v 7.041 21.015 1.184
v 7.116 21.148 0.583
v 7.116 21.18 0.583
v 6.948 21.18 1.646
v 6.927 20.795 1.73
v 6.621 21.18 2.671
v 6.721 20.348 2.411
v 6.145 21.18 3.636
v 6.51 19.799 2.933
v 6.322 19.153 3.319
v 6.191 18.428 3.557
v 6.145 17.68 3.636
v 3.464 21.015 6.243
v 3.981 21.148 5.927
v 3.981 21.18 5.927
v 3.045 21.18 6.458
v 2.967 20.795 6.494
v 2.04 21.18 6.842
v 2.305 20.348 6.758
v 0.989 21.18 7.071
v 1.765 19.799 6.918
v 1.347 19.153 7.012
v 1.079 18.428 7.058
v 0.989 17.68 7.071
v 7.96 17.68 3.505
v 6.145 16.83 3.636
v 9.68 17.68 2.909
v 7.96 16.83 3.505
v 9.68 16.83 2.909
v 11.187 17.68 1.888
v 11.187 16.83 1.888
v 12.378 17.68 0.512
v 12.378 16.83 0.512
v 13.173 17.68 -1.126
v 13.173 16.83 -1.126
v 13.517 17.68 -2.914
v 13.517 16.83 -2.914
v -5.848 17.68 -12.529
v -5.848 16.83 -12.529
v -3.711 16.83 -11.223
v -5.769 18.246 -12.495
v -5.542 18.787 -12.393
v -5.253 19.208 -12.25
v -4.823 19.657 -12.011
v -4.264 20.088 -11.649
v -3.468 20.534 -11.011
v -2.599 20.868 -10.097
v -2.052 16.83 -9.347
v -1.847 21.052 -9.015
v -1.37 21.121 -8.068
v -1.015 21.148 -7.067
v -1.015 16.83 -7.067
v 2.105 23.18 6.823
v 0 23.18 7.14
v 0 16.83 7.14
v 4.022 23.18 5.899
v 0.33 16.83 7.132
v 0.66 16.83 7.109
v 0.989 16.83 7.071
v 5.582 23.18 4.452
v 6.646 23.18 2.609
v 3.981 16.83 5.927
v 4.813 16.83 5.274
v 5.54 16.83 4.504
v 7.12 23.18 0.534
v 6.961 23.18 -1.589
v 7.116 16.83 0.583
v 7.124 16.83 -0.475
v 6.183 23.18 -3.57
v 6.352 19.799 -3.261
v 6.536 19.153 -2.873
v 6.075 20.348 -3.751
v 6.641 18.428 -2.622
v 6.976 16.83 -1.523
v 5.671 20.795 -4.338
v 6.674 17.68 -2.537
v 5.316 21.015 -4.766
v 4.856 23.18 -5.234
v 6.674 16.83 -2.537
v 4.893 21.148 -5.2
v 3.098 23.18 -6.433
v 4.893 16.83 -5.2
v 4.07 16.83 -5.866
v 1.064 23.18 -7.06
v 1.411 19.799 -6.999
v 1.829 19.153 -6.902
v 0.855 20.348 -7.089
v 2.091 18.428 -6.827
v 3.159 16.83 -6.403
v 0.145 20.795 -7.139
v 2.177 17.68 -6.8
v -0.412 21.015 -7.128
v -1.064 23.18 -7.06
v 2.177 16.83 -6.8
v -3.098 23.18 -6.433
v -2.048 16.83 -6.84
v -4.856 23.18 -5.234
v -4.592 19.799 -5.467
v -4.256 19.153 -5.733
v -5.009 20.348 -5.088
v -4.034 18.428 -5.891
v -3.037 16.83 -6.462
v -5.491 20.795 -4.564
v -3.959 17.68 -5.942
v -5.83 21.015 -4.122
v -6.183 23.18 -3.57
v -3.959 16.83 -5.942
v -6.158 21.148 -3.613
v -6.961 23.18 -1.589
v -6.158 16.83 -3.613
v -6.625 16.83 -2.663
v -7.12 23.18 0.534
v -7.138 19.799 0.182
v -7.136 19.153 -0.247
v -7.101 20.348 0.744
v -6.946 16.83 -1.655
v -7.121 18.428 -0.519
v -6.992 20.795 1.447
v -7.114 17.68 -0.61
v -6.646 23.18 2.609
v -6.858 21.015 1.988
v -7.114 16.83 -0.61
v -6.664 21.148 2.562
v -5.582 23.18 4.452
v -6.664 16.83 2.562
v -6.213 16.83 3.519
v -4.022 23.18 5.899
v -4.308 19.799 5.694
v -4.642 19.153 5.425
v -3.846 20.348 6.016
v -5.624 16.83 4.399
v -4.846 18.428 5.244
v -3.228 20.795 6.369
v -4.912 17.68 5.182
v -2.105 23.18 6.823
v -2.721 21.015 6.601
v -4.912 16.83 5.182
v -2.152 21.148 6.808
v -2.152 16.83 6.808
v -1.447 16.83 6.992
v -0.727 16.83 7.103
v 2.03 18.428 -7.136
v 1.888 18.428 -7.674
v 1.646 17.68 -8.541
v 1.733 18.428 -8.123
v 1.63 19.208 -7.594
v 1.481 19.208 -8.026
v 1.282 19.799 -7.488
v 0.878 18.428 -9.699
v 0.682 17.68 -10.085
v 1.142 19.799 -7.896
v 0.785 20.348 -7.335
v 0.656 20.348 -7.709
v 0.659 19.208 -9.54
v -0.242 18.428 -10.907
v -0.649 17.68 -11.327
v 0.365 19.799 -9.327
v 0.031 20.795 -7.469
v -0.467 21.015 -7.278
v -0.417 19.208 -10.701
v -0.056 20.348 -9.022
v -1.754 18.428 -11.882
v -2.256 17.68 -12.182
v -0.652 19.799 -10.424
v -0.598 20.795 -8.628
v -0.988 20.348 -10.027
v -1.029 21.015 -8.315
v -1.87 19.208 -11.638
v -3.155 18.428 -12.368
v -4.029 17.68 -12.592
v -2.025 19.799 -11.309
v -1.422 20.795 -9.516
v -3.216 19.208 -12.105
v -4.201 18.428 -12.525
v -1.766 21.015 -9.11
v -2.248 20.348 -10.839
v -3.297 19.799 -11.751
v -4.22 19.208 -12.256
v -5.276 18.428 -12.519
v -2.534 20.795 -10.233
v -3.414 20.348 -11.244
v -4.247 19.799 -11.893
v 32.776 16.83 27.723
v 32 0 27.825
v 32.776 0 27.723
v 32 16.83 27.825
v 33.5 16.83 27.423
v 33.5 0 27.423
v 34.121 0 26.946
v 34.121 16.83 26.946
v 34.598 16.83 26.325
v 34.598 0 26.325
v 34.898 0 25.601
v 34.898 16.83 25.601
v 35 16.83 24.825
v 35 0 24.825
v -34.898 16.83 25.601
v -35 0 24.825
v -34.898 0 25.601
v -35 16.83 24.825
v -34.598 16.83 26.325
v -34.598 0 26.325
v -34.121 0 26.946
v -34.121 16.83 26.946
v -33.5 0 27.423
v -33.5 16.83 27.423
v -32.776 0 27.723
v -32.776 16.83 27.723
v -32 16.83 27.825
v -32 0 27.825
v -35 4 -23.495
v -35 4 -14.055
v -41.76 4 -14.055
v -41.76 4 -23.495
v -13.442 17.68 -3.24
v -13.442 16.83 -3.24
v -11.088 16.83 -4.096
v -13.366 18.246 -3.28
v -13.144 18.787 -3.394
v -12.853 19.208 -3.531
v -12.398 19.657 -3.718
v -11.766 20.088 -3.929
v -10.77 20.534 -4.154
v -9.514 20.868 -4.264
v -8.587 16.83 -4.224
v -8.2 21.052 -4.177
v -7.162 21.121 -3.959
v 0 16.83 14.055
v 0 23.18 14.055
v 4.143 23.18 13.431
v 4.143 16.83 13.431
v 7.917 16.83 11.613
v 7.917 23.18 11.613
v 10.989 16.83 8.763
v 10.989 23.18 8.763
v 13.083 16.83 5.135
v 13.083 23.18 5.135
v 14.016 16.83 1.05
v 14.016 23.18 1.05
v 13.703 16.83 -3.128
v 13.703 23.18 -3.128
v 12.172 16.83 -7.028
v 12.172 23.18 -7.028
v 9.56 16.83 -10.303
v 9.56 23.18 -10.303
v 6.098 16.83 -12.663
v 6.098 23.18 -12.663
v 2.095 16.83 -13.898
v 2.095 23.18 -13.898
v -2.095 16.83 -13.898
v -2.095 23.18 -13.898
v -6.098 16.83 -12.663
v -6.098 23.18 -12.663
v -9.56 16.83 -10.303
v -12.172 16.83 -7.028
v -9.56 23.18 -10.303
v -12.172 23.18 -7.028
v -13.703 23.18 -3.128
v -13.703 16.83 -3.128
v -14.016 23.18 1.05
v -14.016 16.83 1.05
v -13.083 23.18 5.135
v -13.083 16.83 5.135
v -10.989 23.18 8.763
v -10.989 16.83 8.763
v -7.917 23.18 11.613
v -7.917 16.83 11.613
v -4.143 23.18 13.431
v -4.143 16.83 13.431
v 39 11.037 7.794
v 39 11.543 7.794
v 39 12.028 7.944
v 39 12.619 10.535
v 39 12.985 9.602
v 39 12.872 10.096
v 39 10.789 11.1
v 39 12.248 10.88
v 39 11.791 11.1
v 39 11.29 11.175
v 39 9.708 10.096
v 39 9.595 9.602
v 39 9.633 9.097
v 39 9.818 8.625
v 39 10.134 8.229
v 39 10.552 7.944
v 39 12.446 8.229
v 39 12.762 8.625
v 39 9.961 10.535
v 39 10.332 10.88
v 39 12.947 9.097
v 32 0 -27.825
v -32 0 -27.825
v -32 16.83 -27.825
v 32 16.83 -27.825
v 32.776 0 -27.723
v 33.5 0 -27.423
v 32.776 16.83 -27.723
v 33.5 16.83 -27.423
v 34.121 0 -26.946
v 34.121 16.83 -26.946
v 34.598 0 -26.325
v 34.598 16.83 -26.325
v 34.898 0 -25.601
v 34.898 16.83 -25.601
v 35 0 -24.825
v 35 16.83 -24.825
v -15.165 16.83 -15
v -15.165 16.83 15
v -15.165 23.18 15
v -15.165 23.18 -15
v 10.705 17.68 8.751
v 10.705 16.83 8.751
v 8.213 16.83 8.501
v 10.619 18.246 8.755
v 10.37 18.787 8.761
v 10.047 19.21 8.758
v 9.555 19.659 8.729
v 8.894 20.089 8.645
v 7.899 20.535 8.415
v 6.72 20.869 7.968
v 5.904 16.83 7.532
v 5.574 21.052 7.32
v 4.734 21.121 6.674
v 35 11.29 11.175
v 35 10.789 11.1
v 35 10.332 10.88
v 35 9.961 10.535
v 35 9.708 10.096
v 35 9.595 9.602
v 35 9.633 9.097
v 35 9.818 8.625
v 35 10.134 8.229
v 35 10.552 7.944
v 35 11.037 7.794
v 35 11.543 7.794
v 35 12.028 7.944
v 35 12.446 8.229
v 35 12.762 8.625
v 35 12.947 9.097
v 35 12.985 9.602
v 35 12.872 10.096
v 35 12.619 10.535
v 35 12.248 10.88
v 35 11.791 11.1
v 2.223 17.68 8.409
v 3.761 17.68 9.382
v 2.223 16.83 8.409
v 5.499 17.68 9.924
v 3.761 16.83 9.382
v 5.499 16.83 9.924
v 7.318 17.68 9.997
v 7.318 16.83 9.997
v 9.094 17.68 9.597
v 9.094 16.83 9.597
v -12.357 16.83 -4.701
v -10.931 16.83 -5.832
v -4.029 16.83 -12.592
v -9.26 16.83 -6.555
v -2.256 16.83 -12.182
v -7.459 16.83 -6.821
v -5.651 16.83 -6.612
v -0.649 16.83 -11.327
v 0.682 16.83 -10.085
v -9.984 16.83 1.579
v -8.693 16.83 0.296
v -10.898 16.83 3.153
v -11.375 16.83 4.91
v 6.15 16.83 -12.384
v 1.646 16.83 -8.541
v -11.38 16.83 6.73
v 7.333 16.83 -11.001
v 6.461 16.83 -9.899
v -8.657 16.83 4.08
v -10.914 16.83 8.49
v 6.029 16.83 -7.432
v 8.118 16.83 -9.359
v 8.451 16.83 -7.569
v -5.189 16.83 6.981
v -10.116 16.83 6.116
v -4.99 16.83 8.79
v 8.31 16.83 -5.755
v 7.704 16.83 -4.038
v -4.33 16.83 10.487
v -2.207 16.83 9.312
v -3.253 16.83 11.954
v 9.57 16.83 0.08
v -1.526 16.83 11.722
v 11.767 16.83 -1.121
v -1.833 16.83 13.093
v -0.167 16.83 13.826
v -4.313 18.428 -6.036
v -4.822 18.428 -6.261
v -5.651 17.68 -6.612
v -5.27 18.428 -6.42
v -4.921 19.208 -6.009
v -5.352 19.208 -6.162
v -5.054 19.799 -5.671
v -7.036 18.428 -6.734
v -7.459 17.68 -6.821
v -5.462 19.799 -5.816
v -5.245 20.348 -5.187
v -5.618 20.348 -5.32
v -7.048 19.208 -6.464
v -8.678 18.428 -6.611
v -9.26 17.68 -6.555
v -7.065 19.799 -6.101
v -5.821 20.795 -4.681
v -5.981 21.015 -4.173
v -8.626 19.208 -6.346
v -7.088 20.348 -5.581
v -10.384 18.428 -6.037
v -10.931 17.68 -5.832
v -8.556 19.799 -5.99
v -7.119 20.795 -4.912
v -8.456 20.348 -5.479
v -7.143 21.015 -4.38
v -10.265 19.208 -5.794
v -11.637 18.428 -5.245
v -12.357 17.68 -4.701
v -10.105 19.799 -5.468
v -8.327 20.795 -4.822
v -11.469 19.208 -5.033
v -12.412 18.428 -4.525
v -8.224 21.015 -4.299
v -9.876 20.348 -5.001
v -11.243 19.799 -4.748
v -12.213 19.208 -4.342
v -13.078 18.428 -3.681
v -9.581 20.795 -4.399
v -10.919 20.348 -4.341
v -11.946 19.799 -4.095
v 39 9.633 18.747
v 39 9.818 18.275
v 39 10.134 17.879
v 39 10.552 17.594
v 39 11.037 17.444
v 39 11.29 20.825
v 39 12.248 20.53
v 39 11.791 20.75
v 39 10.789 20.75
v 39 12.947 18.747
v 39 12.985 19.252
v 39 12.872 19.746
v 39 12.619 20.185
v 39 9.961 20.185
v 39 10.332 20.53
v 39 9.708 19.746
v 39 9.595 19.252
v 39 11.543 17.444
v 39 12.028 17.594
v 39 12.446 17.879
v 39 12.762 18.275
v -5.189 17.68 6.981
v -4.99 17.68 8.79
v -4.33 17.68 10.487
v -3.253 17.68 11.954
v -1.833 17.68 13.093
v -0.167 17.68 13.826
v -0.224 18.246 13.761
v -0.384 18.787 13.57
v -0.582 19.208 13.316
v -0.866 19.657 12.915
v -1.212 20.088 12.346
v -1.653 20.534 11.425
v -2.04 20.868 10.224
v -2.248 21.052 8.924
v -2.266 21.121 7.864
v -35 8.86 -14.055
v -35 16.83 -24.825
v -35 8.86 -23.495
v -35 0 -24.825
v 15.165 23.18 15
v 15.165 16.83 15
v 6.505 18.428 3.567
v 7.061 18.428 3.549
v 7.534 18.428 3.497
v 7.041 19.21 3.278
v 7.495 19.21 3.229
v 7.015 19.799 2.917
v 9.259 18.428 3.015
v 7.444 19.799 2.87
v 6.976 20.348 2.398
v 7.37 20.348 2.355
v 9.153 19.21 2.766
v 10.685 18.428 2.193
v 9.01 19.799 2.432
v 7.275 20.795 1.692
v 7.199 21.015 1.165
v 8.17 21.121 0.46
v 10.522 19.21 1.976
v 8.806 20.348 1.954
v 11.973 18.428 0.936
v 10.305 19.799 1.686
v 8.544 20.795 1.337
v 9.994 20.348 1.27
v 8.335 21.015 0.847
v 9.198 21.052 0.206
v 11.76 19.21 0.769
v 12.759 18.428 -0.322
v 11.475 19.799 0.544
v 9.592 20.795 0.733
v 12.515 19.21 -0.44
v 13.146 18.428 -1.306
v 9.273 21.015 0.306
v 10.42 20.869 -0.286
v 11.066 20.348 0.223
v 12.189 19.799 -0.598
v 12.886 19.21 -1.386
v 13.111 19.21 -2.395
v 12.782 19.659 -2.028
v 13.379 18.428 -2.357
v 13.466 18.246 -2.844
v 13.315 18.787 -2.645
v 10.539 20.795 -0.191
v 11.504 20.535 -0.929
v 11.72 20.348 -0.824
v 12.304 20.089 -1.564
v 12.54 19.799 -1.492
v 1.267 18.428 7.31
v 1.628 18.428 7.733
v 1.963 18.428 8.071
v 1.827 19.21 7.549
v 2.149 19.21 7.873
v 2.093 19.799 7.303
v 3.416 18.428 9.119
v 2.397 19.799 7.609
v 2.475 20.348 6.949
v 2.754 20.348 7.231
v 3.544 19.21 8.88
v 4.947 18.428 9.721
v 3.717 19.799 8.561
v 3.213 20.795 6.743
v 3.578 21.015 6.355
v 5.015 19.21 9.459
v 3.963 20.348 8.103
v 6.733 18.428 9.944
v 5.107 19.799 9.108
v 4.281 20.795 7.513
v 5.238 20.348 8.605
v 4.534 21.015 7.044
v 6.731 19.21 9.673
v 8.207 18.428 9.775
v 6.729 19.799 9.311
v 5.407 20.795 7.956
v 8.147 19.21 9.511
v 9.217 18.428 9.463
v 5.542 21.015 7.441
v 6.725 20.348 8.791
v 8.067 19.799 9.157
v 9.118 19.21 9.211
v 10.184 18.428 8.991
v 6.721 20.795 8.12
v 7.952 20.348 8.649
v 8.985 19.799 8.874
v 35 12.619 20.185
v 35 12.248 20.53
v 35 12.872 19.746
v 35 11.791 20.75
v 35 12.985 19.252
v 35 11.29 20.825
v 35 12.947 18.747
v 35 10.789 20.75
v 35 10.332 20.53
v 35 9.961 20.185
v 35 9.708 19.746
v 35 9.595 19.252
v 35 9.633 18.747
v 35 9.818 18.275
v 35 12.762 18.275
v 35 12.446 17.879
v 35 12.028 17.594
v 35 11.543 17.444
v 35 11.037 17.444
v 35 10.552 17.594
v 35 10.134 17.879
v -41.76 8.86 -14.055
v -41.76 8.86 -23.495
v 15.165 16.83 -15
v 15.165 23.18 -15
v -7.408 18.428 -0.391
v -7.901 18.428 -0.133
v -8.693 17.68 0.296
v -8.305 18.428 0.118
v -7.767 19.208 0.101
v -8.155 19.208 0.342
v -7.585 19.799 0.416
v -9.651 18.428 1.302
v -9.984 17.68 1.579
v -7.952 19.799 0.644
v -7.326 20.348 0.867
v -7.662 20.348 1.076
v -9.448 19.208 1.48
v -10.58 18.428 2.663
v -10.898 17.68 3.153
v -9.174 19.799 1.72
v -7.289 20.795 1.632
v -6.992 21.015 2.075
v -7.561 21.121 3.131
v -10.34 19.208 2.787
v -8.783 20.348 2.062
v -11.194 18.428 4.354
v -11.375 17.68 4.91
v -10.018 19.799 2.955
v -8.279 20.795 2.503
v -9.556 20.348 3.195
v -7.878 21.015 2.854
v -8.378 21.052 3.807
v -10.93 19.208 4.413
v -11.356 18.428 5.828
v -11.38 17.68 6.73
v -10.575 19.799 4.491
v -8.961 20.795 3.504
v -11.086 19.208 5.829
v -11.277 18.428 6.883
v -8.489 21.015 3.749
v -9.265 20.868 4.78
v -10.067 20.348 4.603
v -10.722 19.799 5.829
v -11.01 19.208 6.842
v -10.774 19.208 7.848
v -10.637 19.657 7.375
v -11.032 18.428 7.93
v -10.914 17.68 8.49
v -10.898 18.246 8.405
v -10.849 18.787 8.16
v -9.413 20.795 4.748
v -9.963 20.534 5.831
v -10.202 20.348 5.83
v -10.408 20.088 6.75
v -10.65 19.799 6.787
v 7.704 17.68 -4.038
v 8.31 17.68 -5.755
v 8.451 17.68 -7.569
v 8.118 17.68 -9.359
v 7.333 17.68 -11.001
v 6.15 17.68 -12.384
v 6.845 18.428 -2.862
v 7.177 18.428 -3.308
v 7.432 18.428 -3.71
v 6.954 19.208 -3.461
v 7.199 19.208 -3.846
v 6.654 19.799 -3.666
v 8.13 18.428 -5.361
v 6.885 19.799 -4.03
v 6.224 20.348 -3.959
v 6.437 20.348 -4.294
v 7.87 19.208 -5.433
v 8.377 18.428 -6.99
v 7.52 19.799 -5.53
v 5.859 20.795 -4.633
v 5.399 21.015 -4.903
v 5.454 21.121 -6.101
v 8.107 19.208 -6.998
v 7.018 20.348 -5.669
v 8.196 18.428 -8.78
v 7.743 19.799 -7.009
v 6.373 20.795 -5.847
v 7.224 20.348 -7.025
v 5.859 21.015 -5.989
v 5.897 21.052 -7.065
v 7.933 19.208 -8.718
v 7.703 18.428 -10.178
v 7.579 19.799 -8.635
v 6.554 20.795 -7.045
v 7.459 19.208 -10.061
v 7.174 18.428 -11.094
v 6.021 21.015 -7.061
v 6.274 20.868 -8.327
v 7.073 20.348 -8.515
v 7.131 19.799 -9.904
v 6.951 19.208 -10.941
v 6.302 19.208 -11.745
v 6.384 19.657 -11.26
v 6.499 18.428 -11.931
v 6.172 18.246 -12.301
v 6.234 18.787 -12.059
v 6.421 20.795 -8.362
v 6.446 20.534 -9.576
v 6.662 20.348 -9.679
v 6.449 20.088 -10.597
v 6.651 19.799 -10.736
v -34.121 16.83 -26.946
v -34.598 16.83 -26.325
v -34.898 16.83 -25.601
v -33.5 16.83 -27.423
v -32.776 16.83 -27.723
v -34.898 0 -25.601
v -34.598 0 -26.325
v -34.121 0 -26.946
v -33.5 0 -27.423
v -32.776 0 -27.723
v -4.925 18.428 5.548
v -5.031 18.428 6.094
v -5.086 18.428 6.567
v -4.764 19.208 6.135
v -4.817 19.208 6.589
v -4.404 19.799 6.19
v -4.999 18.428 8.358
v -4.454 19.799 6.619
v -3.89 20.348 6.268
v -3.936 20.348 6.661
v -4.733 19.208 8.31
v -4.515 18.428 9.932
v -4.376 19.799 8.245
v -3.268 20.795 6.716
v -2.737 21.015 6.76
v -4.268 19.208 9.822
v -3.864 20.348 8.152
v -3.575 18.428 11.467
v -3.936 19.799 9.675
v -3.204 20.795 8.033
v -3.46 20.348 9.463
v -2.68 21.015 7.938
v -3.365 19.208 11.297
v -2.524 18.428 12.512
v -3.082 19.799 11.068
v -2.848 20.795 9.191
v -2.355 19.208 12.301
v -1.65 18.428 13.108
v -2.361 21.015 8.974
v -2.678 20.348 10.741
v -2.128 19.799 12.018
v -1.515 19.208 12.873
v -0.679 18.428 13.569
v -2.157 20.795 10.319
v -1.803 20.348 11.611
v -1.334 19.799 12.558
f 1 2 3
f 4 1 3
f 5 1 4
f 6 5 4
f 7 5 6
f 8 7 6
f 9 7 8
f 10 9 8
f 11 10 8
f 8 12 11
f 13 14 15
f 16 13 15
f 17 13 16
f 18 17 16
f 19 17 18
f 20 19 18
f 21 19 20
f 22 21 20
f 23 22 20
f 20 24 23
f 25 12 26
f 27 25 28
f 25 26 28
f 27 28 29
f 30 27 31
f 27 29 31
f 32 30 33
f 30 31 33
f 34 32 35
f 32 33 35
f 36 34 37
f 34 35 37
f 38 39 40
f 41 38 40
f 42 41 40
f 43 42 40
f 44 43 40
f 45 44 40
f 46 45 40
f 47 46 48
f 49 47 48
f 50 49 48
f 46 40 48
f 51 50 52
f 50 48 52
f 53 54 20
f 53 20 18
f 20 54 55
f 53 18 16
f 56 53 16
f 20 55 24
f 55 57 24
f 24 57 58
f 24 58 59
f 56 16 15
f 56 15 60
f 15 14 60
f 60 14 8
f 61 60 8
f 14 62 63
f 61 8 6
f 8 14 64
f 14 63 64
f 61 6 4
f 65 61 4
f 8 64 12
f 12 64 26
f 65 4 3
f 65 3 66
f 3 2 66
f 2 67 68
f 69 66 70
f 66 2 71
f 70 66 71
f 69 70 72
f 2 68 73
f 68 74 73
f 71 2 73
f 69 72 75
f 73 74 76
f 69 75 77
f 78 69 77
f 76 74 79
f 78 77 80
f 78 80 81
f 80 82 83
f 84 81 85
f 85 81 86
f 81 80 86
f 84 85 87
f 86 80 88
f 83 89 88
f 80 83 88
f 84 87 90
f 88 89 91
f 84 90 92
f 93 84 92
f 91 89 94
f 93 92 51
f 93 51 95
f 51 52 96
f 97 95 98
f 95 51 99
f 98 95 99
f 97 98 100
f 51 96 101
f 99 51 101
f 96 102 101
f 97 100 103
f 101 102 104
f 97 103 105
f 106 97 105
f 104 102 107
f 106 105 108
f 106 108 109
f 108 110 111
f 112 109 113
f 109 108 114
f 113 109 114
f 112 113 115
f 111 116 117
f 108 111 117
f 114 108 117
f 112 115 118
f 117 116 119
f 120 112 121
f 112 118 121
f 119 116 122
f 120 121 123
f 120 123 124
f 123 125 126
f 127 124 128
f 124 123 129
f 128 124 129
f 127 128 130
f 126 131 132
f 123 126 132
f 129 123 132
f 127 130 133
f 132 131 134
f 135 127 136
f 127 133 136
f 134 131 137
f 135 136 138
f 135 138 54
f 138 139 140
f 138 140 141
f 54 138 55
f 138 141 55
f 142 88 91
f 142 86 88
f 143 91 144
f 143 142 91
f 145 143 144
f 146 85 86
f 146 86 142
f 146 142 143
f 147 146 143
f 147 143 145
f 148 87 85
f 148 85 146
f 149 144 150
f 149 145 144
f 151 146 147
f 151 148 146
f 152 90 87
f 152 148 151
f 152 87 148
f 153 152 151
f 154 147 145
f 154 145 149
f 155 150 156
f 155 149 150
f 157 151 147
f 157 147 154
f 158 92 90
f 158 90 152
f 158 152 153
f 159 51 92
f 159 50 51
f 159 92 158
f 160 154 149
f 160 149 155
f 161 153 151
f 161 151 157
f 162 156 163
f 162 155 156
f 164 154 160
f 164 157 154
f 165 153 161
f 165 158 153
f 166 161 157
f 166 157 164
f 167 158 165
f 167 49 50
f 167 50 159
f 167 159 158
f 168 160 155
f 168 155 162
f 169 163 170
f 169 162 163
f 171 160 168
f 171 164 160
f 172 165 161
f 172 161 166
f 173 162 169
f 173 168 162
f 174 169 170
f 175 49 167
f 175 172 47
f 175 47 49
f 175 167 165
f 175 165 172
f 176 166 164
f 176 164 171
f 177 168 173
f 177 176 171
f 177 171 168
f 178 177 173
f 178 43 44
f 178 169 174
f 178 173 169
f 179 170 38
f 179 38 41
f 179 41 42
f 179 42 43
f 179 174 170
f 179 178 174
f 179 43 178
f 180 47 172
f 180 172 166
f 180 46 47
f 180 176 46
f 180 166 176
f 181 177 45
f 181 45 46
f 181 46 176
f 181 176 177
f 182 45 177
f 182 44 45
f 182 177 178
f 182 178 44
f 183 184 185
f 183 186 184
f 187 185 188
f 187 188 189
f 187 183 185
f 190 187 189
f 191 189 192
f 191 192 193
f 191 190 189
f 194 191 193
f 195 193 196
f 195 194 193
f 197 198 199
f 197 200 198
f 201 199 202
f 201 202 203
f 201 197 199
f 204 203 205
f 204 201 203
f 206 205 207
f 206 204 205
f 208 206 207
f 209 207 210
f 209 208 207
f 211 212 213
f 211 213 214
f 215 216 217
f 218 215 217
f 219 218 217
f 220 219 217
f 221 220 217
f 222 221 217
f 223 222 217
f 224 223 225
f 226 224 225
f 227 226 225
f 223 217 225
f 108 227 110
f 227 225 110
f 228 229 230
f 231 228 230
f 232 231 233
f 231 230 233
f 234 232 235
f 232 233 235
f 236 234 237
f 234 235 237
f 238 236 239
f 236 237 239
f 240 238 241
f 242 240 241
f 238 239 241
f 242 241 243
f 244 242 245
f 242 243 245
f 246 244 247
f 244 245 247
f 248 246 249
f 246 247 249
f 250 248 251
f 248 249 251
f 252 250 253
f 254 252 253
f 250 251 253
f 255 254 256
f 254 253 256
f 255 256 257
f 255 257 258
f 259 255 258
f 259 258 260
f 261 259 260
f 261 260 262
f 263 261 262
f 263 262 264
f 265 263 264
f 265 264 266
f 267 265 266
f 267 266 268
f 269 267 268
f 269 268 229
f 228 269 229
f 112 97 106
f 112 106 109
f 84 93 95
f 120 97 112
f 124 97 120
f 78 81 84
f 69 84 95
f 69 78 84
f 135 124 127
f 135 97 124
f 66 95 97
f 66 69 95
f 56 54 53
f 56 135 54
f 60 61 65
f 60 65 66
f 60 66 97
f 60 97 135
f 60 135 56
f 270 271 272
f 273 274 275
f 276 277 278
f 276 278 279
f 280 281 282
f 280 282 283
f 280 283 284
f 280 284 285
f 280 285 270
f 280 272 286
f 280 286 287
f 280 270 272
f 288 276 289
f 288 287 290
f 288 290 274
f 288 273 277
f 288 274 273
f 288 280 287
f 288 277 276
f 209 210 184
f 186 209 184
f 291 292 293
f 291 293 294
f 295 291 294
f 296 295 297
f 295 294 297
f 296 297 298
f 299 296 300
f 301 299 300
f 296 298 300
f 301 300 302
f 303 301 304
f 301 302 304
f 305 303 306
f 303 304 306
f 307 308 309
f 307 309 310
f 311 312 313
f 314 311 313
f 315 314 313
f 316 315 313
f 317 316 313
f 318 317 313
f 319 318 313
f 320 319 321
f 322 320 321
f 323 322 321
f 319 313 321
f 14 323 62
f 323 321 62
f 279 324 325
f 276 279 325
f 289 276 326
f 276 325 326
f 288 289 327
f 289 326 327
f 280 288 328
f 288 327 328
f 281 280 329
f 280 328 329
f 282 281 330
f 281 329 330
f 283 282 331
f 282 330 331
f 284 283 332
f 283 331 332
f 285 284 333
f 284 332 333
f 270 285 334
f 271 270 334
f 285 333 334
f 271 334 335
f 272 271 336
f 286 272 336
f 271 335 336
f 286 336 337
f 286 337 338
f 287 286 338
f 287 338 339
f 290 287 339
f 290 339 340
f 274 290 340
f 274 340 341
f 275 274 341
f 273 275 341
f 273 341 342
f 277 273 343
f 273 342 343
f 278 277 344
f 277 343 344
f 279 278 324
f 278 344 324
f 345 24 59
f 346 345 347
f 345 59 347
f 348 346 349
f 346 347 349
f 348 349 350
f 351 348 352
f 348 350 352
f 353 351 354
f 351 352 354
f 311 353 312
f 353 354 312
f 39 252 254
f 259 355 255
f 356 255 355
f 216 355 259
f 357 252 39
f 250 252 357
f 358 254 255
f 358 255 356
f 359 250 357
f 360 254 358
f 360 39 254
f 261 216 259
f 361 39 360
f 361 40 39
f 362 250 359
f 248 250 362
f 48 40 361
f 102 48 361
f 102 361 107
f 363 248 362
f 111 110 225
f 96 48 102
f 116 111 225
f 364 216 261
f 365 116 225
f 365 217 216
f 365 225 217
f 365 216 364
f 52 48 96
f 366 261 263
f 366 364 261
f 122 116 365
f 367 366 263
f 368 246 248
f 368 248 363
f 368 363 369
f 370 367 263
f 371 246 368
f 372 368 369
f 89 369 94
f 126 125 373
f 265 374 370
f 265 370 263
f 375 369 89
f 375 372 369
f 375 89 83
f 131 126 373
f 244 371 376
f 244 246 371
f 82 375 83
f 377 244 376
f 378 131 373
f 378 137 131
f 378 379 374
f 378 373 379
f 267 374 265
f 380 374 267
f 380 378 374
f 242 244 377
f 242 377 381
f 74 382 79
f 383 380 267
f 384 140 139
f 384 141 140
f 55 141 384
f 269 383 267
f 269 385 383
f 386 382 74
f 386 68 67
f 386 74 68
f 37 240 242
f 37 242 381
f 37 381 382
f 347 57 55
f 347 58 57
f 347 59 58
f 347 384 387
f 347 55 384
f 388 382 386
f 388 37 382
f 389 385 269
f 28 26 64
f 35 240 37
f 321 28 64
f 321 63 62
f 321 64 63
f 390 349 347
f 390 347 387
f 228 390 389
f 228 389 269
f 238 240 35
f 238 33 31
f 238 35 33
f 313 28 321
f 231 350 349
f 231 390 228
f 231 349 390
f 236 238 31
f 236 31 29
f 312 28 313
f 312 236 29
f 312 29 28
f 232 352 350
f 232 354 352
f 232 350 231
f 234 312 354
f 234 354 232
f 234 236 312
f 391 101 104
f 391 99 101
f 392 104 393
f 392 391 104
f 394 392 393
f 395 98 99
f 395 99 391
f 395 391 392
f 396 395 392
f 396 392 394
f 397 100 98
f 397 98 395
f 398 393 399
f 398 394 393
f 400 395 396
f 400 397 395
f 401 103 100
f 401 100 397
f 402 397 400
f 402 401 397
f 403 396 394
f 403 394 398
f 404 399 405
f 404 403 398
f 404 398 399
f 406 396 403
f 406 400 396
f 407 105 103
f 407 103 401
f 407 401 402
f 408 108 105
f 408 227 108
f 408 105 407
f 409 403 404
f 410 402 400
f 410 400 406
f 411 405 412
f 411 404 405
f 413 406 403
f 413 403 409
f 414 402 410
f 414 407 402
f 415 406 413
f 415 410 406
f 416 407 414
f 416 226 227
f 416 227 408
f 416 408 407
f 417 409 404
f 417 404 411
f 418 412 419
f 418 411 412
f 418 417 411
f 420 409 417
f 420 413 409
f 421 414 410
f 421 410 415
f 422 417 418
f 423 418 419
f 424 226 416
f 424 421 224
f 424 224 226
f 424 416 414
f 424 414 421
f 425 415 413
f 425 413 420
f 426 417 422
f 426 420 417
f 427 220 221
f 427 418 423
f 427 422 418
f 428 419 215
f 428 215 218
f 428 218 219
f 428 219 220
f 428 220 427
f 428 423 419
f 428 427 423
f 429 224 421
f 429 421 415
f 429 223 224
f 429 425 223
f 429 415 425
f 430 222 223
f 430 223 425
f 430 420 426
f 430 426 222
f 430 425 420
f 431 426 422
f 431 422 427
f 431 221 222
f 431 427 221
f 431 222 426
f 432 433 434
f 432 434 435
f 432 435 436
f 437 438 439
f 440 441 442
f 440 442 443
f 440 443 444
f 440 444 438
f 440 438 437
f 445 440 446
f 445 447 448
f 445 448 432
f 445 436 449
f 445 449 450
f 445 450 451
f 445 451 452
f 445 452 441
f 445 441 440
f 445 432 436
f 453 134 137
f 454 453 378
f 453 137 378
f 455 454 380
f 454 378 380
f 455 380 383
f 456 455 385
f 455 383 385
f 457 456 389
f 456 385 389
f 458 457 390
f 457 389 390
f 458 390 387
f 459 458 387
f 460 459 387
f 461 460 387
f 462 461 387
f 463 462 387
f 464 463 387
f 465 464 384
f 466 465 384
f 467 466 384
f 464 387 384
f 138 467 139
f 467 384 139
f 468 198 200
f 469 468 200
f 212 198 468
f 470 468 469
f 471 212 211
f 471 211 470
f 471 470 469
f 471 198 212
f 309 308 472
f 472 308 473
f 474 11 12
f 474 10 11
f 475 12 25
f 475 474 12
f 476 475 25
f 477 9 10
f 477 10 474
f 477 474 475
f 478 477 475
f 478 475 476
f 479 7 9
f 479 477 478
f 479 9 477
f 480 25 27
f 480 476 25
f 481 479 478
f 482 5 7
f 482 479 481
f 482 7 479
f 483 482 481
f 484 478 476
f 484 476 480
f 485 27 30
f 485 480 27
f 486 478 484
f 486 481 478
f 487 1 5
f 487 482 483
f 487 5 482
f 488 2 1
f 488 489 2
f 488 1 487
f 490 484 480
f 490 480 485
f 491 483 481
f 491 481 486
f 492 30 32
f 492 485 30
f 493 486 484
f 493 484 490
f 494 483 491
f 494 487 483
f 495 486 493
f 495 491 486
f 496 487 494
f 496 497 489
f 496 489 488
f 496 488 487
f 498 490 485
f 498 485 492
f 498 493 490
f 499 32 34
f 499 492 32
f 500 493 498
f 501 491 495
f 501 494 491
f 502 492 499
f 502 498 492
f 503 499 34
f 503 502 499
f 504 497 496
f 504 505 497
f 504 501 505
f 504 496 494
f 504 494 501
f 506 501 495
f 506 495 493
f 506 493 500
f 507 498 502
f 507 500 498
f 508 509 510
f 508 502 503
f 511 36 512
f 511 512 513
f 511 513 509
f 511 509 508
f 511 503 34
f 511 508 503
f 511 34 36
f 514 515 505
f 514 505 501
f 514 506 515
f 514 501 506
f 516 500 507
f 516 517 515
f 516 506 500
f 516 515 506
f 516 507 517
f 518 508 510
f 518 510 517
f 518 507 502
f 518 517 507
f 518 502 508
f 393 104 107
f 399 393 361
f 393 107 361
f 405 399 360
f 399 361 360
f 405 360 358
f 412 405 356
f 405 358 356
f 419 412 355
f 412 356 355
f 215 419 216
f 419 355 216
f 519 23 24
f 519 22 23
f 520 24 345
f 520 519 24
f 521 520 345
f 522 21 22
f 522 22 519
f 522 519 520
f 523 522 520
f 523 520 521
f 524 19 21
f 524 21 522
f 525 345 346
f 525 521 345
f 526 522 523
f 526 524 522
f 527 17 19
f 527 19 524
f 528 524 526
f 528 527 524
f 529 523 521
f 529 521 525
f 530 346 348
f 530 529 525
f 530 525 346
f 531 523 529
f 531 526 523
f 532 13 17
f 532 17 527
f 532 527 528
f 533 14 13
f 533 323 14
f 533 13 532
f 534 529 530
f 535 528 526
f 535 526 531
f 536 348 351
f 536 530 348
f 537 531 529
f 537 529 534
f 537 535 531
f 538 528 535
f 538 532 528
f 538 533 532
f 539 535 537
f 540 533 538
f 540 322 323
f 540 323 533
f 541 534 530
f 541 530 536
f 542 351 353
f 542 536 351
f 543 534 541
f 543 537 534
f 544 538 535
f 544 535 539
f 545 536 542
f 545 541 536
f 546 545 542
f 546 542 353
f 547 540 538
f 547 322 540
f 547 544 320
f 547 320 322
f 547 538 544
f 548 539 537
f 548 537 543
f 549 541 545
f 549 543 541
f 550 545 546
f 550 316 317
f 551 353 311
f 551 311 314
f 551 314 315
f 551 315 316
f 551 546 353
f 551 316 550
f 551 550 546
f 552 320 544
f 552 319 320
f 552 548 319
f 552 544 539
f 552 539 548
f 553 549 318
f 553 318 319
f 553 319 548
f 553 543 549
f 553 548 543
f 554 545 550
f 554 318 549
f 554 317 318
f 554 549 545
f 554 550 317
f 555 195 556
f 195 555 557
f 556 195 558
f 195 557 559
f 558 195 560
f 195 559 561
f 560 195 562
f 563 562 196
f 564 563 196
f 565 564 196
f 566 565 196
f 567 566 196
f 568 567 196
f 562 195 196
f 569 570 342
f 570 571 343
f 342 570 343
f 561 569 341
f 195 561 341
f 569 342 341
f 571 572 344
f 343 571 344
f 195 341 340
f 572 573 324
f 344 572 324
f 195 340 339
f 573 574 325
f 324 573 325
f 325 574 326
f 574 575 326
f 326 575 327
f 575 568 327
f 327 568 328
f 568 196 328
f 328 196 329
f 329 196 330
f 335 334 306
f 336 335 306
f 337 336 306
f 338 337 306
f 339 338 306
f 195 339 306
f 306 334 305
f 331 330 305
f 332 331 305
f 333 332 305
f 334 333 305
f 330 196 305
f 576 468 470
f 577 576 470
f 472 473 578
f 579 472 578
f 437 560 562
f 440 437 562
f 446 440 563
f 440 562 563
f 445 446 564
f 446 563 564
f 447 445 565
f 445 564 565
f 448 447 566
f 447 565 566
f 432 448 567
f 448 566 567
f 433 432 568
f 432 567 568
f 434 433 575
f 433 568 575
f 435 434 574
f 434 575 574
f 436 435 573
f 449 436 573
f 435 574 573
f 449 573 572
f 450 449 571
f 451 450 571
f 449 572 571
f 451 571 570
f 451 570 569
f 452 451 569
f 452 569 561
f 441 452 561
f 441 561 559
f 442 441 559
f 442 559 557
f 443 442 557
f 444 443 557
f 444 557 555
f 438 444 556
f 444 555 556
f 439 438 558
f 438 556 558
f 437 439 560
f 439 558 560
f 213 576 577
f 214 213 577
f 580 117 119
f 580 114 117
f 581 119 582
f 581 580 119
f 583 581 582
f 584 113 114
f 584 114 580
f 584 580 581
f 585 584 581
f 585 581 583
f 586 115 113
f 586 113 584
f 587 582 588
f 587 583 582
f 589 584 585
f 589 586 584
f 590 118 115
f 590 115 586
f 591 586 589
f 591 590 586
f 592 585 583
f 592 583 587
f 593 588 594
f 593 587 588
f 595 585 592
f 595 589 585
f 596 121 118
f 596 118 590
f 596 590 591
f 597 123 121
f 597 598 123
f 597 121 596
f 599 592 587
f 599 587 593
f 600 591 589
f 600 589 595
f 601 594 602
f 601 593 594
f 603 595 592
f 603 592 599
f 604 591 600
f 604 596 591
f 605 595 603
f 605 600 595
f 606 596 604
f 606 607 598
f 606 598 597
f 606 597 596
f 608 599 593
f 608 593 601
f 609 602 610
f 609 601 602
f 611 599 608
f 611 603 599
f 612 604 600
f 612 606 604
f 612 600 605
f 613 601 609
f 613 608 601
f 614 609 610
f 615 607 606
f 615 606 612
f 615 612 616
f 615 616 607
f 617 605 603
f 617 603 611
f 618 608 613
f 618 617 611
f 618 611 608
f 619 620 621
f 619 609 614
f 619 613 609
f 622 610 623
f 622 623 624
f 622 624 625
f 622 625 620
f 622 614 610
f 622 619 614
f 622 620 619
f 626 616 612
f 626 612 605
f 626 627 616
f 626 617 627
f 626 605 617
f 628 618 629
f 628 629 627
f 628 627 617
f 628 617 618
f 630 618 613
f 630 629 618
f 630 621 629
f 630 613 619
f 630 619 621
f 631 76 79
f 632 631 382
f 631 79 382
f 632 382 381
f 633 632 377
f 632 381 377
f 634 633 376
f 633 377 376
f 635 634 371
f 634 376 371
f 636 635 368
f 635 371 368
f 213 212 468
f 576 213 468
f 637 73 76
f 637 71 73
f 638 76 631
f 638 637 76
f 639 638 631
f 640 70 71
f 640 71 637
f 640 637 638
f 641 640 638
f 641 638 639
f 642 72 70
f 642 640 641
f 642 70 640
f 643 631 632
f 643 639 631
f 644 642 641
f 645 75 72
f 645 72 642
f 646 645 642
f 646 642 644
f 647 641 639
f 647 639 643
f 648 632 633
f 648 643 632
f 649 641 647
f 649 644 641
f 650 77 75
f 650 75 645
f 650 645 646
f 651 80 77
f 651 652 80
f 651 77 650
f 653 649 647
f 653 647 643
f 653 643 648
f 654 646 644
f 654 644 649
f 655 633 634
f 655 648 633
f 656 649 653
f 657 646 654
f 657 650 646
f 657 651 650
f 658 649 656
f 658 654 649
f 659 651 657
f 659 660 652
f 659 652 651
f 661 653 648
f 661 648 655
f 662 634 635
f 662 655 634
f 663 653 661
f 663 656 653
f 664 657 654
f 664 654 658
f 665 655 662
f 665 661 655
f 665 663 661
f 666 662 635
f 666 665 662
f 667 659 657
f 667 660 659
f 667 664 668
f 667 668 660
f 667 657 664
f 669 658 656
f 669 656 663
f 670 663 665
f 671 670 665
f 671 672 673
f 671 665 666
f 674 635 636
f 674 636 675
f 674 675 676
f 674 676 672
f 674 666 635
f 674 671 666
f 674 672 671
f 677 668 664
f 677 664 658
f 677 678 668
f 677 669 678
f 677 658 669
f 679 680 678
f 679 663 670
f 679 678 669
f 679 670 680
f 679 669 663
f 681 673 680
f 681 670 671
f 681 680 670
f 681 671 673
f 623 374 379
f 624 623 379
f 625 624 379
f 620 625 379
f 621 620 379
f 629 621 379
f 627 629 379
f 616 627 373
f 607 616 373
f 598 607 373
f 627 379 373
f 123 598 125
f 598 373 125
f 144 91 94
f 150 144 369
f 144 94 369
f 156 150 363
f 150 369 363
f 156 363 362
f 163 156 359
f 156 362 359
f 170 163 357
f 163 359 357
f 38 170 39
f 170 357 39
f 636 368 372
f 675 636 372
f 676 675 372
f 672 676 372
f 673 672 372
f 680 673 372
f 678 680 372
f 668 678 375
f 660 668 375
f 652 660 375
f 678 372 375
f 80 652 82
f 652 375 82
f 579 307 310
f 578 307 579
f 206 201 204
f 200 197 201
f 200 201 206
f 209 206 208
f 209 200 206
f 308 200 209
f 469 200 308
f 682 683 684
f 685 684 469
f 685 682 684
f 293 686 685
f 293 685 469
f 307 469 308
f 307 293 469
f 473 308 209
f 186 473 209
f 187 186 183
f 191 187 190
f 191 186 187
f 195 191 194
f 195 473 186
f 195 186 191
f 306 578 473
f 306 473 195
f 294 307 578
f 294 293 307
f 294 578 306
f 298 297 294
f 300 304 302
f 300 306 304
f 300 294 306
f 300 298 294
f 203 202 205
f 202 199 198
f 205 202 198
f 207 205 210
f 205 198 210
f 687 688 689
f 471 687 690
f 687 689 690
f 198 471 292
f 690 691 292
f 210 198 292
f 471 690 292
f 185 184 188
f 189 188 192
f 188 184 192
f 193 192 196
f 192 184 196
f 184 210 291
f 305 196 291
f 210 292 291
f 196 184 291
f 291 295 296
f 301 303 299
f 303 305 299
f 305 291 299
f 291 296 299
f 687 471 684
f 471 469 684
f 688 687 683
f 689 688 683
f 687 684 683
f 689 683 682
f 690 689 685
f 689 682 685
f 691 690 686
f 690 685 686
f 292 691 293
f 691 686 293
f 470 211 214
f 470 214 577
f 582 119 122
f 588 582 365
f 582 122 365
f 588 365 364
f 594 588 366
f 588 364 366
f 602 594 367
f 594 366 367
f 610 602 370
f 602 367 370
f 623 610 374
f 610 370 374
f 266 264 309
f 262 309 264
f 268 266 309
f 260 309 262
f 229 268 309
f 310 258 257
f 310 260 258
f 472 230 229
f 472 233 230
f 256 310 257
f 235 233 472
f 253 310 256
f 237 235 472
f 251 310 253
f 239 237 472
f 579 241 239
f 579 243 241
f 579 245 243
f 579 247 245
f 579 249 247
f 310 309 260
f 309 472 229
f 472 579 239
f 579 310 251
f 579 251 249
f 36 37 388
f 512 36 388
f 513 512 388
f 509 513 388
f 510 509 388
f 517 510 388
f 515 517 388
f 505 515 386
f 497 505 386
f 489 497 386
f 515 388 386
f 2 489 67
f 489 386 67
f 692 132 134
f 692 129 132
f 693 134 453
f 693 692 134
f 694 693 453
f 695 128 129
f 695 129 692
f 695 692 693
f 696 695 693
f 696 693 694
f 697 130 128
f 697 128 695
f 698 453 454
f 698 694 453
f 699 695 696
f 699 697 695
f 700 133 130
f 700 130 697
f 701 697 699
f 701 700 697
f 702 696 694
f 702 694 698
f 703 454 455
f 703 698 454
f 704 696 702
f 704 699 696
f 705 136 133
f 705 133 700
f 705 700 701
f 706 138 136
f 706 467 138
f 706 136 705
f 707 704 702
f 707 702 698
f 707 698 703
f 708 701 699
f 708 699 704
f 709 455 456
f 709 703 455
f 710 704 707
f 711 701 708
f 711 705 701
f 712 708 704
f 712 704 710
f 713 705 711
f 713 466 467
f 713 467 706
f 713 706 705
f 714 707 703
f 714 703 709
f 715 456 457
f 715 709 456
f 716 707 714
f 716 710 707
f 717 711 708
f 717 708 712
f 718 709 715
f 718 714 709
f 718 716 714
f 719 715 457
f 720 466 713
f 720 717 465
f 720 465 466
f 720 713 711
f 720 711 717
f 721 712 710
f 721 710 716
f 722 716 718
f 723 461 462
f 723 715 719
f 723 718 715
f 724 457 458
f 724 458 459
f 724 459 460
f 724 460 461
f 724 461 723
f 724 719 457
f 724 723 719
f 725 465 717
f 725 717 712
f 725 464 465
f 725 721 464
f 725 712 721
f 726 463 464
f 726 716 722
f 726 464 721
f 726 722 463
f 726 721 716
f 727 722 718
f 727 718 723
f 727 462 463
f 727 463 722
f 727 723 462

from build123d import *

# Parameters (mm, degrees)
SKETCH1_W           = 70
SKETCH1_H           = 55.65
BOSS_EXTRUDE1_DEPTH = 16.83
BOSS_EXTRUDE2_START = 16.83
SKETCH2_W           = 30.33
SKETCH2_H           = 30
BOSS_EXTRUDE2_DEPTH = 6.35
SKETCH3_R           = 14.055
BOSS_EXTRUDE3_DEPTH = 6.35
SKETCH4_R           = 14.055
CUT_EXTRUDE1_DEPTH  = 6.35
BOSS_EXTRUDE4_START = -35
SKETCH5_W           = 9.44
SKETCH5_H           = 4.86
BOSS_EXTRUDE4_DEPTH = 6.76
SKETCH6_R           = 1.7
BOSS_EXTRUDE5_DEPTH = 4
FILLET1_R           = 3
SKETCH7_R           = 7.14
BOSS_EXTRUDE6_DEPTH = 6.35
BOSS_EXTRUDE7_DEPTH = 4.35
FILLET3_R           = 3.5
CIRPATTERN11_COUNT  = 7
FILLET4_R           = 3.5


with BuildPart() as part:
    # Sketch1 → Boss-Extrude1 (new body)
    with BuildSketch(Plane(origin=(0, 0, 0), x_dir=(1, 0, 0), z_dir=(0, 1, 0))):
        Rectangle(SKETCH1_W, SKETCH1_H)
    extrude(amount=BOSS_EXTRUDE1_DEPTH)

    # Sketch2 → Boss-Extrude2 (add)
    with BuildSketch(Plane(origin=(0, 0, 0), x_dir=(1, 0, 0), z_dir=(0, 1, 0)).offset(BOSS_EXTRUDE2_START)):
        Rectangle(SKETCH2_W, SKETCH2_H)
    extrude(amount=BOSS_EXTRUDE2_DEPTH)

    # Sketch3 → Boss-Extrude3 (add)
    with BuildSketch(Plane(origin=(0, 23.18, 0), x_dir=(1, 0, 0), z_dir=(0, 1, 0))):
        Circle(SKETCH3_R)
    extrude(amount=-BOSS_EXTRUDE3_DEPTH)

    # Sketch4 → Cut-Extrude1 (cut)
    with BuildSketch(Plane(origin=(0, 23.18, 0), x_dir=(1, 0, 0), z_dir=(0, 1, 0))):
        with Locations(Location((0, 0, 0), (0, 0, 270))):
            Circle(SKETCH4_R)
    extrude(amount=-CUT_EXTRUDE1_DEPTH, mode=Mode.SUBTRACT)

    # Sketch5 → Boss-Extrude4 (add)
    with BuildSketch(Plane(origin=(0, 0, 0), x_dir=(0, 0, -1), z_dir=(1, 0, 0)).offset(BOSS_EXTRUDE4_START)):
        with Locations((18.775, 6.43)):
            Rectangle(SKETCH5_W, SKETCH5_H)
    extrude(amount=-BOSS_EXTRUDE4_DEPTH)

    # Sketch6 → Boss-Extrude5 (add)
    with BuildSketch(Plane(origin=(35, 0, 0), x_dir=(0, 0, -1), z_dir=(1, 0, 0))):
        with Locations(Location((-19.125364984, 11.29, 0), (0, 0, 180))):
            Circle(SKETCH6_R)
        with Locations(Location((-9.475364984, 11.29, 0), (0, 0, 180))):
            Circle(SKETCH6_R)
    extrude(amount=BOSS_EXTRUDE5_DEPTH)

    # Fillet1
    fillet1_edges = [part.edges().sort_by_distance(p)[0] for p in [
        (-35, 8.415, -27.825),
        (35, 8.415, -27.825),
        (35, 8.415, 27.825),
        (-35, 8.415, 27.825),
    ]]
    fillet(fillet1_edges, radius=FILLET1_R)

    # Sketch7 → Boss-Extrude6 (add)
    with BuildSketch(Plane(origin=(0, 16.83, 0), x_dir=(1, 0, 0), z_dir=(0, 1, 0))):
        with Locations(Location((0, 0, 0), (0, 0, 270))):
            Circle(SKETCH7_R)
    extrude(amount=BOSS_EXTRUDE6_DEPTH)

    # Sketch11 → Boss-Extrude7 (add)
    with BuildSketch(Plane(origin=(0, 16.83, 0), x_dir=(1, 0, 0), z_dir=(0, 1, 0))):
        with BuildLine():
            ThreePointArc((7.116145586, -0.583156929), (6.803943672, -2.164705639), (6.144899887, -3.635905029))
            ThreePointArc((6.144899887, -3.635905029), (11.187164412, -1.887909247), (13.51656418, 2.913529862))
            ThreePointArc((13.51656418, 2.913529862), (10.713284894, 0.438636341), (7.116145586, -0.583156929))
        make_face()
    boss_extrude7 = extrude(amount=BOSS_EXTRUDE7_DEPTH)

    # Fillet3
    # the kernel refuses this fillet: 3.5 mm, written as the material it takes off along each edge
    with BuildSketch(Plane(origin=(6.556014588, 21.18, -3.324644563), x_dir=(-0.9673093233437143, 0, 0.25359943409307006), z_dir=(-0.25359943409307006, 0, -0.9673093233437143))) as fillet3_piece_1_section:
        with BuildLine():
            CenterArc((6.972679966 - FILLET3_R, -FILLET3_R), FILLET3_R, 0, 90)
            Line((6.972679966 - FILLET3_R, 0), (6.972679966, 0))
            Line((6.972679966, 0), (6.972679966, -FILLET3_R))
        make_face()
    fillet3_piece_1 = revolve(axis=Axis((6.556014588, 21.18, -3.324644563), (0, 1, 0)), revolution_arc=233.858448906, mode=Mode.PRIVATE)
    fillet3_piece_1 = fillet3_piece_1 - Plane(origin=(0, 20.294110175, 0), x_dir=(0, 0, 1), z_dir=(0, -1, 0)) * Cylinder(7.14, 28, mode=Mode.PRIVATE)
    fillet3_piece_1 = fillet3_piece_1 - Plane(origin=(6.664387144, 20.294110175, -7.849834998), x_dir=(0.8113805957786566, 0, 0.5845182022776301), z_dir=(0, -1, 0)) * Cylinder(8.445083689, 28, mode=Mode.PRIVATE)
    add(fillet3_piece_1, mode=Mode.SUBTRACT)

    # CirPattern11: Boss-Extrude7 ×7 about axis
    cirpattern11_axis = Axis((0, 0, 0), (0, 1, 0))
    for i in range(1, CIRPATTERN11_COUNT):
        add(boss_extrude7.rotate(cirpattern11_axis, i * 360 / CIRPATTERN11_COUNT))

    # Fillet4
    # the kernel refuses this fillet: 3.5 mm, written as the material it takes off along each edge
    with BuildSketch(Plane(origin=(6.686920024, 21.18, 3.052816625), x_dir=(-0.8013795198577165, 0, -0.5981562213607877), z_dir=(0.5981562213607877, 0, -0.8013795198577165))) as fillet4_piece_1_section:
        with BuildLine():
            CenterArc((6.972679966 - FILLET4_R, -FILLET4_R), FILLET4_R, 0, 90)
            Line((6.972679966 - FILLET4_R, 0), (6.972679966, 0))
            Line((6.972679966, 0), (6.972679966, -FILLET4_R))
        make_face()
    fillet4_piece_1 = revolve(axis=Axis((6.686920024, 21.18, 3.052816625), (0, 1, 0)), revolution_arc=233.858448906, mode=Mode.PRIVATE)
    fillet4_piece_1 = fillet4_piece_1 - Plane(origin=(0, 20.294110175, 0), x_dir=(0, 0, 1), z_dir=(0, -1, 0)) * Cylinder(7.14, 28, mode=Mode.PRIVATE)
    fillet4_piece_1 = fillet4_piece_1 - Plane(origin=(10.292425554, 20.294110175, 0.316135614), x_dir=(0.04889279427778842, 0, 0.998804032164323), z_dir=(0, -1, 0)) * Cylinder(8.445083689, 28, mode=Mode.PRIVATE)
    add(fillet4_piece_1, mode=Mode.SUBTRACT)
    with BuildSketch(Plane(origin=(1.782438293, 21.18, 7.131444628), x_dir=(-0.0319945927557557, 0, -0.9994880419666827), z_dir=(0.9994880419666827, 0, -0.0319945927557557))) as fillet4_piece_2_section:
        with BuildLine():
            CenterArc((6.972679966 - FILLET4_R, -FILLET4_R), FILLET4_R, 0, 90)
            Line((6.972679966 - FILLET4_R, 0), (6.972679966, 0))
            Line((6.972679966, 0), (6.972679966, -FILLET4_R))
        make_face()
    fillet4_piece_2 = revolve(axis=Axis((1.782438293, 21.18, 7.131444628), (0, 1, 0)), revolution_arc=233.858448906, mode=Mode.PRIVATE)
    fillet4_piece_2 = fillet4_piece_2 & Plane(origin=(0, 20.294110175, 0), x_dir=(0, 0, 1), z_dir=(0, 1, 0)) * Cylinder(14.055, 28, mode=Mode.PRIVATE)
    fillet4_piece_2 = fillet4_piece_2 - Plane(origin=(0, 20.294110175, 0), x_dir=(0, 0, 1), z_dir=(0, -1, 0)) * Cylinder(7.14, 28, mode=Mode.PRIVATE)
    add(fillet4_piece_2, mode=Mode.SUBTRACT)
    with BuildSketch(Plane(origin=(-4.464255827, 21.18, 5.839949371), x_dir=(0.7614829152620437, 0, -0.6481849811311732), z_dir=(0.6481849811311732, 0, 0.7614829152620437))) as fillet4_piece_3_section:
        with BuildLine():
            CenterArc((6.972679966 - FILLET4_R, -FILLET4_R), FILLET4_R, 0, 90)
            Line((6.972679966 - FILLET4_R, 0), (6.972679966, 0))
            Line((6.972679966, 0), (6.972679966, -FILLET4_R))
        make_face()
    fillet4_piece_3 = revolve(axis=Axis((-4.464255827, 21.18, 5.839949371), (0, 1, 0)), revolution_arc=233.858448906, mode=Mode.PRIVATE)
    fillet4_piece_3 = fillet4_piece_3 & Plane(origin=(0, 20.294110175, 0), x_dir=(0, 0, 1), z_dir=(0, 1, 0)) * Cylinder(14.055, 28, mode=Mode.PRIVATE)
    fillet4_piece_3 = fillet4_piece_3 - Plane(origin=(0, 20.294110175, 0), x_dir=(0, 0, 1), z_dir=(0, -1, 0)) * Cylinder(7.14, 28, mode=Mode.PRIVATE)
    add(fillet4_piece_3, mode=Mode.SUBTRACT)
    with BuildSketch(Plane(origin=(-7.349274256, 21.18, 0.150853125), x_dir=(0.9815482566668393, 0, 0.19121459106011865), z_dir=(-0.19121459106011865, 0, 0.9815482566668393))) as fillet4_piece_4_section:
        with BuildLine():
            CenterArc((6.972679966 - FILLET4_R, -FILLET4_R), FILLET4_R, 0, 90)
            Line((6.972679966 - FILLET4_R, 0), (6.972679966, 0))
            Line((6.972679966, 0), (6.972679966, -FILLET4_R))
        make_face()
    fillet4_piece_4 = revolve(axis=Axis((-7.349274256, 21.18, 0.150853125), (0, 1, 0)), revolution_arc=233.858448906, mode=Mode.PRIVATE)
    fillet4_piece_4 = fillet4_piece_4 & Plane(origin=(0, 20.294110175, 0), x_dir=(0, 0, 1), z_dir=(0, 1, 0)) * Cylinder(14.055, 28, mode=Mode.PRIVATE)
    fillet4_piece_4 = fillet4_piece_4 - Plane(origin=(0, 20.294110175, 0), x_dir=(0, 0, 1), z_dir=(0, -1, 0)) * Cylinder(7.14, 28, mode=Mode.PRIVATE)
    add(fillet4_piece_4, mode=Mode.SUBTRACT)
    with BuildSketch(Plane(origin=(-4.700139271, 21.18, -5.651838602), x_dir=(0.4624877408659423, 0, 0.8866256761163174), z_dir=(-0.8866256761163174, 0, 0.4624877408659423))) as fillet4_piece_5_section:
        with BuildLine():
            CenterArc((6.972679966 - FILLET4_R, -FILLET4_R), FILLET4_R, 0, 90)
            Line((6.972679966 - FILLET4_R, 0), (6.972679966, 0))
            Line((6.972679966, 0), (6.972679966, -FILLET4_R))
        make_face()
    fillet4_piece_5 = revolve(axis=Axis((-4.700139271, 21.18, -5.651838602), (0, 1, 0)), revolution_arc=233.858448906, mode=Mode.PRIVATE)
    fillet4_piece_5 = fillet4_piece_5 & Plane(origin=(0, 20.294110175, 0), x_dir=(0, 0, 1), z_dir=(0, 1, 0)) * Cylinder(14.055, 28, mode=Mode.PRIVATE)
    fillet4_piece_5 = fillet4_piece_5 - Plane(origin=(0, 20.294110175, 0), x_dir=(0, 0, 1), z_dir=(0, -1, 0)) * Cylinder(7.14, 28, mode=Mode.PRIVATE)
    add(fillet4_piece_5, mode=Mode.SUBTRACT)
    with BuildSketch(Plane(origin=(1.488296449, 21.18, -7.198580584), x_dir=(-0.4048354768376397, 0, 0.9143895431891382), z_dir=(-0.9143895431891382, 0, -0.4048354768376397))) as fillet4_piece_6_section:
        with BuildLine():
            CenterArc((6.972679966 - FILLET4_R, -FILLET4_R), FILLET4_R, 0, 90)
            Line((6.972679966 - FILLET4_R, 0), (6.972679966, 0))
            Line((6.972679966, 0), (6.972679966, -FILLET4_R))
        make_face()
    fillet4_piece_6 = revolve(axis=Axis((1.488296449, 21.18, -7.198580584), (0, 1, 0)), revolution_arc=233.858448906, mode=Mode.PRIVATE)
    fillet4_piece_6 = fillet4_piece_6 & Plane(origin=(0, 20.294110175, 0), x_dir=(0, 0, 1), z_dir=(0, 1, 0)) * Cylinder(14.055, 28, mode=Mode.PRIVATE)
    fillet4_piece_6 = fillet4_piece_6 - Plane(origin=(0, 20.294110175, 0), x_dir=(0, 0, 1), z_dir=(0, -1, 0)) * Cylinder(7.14, 28, mode=Mode.PRIVATE)
    add(fillet4_piece_6, mode=Mode.SUBTRACT)


solid = part.part
